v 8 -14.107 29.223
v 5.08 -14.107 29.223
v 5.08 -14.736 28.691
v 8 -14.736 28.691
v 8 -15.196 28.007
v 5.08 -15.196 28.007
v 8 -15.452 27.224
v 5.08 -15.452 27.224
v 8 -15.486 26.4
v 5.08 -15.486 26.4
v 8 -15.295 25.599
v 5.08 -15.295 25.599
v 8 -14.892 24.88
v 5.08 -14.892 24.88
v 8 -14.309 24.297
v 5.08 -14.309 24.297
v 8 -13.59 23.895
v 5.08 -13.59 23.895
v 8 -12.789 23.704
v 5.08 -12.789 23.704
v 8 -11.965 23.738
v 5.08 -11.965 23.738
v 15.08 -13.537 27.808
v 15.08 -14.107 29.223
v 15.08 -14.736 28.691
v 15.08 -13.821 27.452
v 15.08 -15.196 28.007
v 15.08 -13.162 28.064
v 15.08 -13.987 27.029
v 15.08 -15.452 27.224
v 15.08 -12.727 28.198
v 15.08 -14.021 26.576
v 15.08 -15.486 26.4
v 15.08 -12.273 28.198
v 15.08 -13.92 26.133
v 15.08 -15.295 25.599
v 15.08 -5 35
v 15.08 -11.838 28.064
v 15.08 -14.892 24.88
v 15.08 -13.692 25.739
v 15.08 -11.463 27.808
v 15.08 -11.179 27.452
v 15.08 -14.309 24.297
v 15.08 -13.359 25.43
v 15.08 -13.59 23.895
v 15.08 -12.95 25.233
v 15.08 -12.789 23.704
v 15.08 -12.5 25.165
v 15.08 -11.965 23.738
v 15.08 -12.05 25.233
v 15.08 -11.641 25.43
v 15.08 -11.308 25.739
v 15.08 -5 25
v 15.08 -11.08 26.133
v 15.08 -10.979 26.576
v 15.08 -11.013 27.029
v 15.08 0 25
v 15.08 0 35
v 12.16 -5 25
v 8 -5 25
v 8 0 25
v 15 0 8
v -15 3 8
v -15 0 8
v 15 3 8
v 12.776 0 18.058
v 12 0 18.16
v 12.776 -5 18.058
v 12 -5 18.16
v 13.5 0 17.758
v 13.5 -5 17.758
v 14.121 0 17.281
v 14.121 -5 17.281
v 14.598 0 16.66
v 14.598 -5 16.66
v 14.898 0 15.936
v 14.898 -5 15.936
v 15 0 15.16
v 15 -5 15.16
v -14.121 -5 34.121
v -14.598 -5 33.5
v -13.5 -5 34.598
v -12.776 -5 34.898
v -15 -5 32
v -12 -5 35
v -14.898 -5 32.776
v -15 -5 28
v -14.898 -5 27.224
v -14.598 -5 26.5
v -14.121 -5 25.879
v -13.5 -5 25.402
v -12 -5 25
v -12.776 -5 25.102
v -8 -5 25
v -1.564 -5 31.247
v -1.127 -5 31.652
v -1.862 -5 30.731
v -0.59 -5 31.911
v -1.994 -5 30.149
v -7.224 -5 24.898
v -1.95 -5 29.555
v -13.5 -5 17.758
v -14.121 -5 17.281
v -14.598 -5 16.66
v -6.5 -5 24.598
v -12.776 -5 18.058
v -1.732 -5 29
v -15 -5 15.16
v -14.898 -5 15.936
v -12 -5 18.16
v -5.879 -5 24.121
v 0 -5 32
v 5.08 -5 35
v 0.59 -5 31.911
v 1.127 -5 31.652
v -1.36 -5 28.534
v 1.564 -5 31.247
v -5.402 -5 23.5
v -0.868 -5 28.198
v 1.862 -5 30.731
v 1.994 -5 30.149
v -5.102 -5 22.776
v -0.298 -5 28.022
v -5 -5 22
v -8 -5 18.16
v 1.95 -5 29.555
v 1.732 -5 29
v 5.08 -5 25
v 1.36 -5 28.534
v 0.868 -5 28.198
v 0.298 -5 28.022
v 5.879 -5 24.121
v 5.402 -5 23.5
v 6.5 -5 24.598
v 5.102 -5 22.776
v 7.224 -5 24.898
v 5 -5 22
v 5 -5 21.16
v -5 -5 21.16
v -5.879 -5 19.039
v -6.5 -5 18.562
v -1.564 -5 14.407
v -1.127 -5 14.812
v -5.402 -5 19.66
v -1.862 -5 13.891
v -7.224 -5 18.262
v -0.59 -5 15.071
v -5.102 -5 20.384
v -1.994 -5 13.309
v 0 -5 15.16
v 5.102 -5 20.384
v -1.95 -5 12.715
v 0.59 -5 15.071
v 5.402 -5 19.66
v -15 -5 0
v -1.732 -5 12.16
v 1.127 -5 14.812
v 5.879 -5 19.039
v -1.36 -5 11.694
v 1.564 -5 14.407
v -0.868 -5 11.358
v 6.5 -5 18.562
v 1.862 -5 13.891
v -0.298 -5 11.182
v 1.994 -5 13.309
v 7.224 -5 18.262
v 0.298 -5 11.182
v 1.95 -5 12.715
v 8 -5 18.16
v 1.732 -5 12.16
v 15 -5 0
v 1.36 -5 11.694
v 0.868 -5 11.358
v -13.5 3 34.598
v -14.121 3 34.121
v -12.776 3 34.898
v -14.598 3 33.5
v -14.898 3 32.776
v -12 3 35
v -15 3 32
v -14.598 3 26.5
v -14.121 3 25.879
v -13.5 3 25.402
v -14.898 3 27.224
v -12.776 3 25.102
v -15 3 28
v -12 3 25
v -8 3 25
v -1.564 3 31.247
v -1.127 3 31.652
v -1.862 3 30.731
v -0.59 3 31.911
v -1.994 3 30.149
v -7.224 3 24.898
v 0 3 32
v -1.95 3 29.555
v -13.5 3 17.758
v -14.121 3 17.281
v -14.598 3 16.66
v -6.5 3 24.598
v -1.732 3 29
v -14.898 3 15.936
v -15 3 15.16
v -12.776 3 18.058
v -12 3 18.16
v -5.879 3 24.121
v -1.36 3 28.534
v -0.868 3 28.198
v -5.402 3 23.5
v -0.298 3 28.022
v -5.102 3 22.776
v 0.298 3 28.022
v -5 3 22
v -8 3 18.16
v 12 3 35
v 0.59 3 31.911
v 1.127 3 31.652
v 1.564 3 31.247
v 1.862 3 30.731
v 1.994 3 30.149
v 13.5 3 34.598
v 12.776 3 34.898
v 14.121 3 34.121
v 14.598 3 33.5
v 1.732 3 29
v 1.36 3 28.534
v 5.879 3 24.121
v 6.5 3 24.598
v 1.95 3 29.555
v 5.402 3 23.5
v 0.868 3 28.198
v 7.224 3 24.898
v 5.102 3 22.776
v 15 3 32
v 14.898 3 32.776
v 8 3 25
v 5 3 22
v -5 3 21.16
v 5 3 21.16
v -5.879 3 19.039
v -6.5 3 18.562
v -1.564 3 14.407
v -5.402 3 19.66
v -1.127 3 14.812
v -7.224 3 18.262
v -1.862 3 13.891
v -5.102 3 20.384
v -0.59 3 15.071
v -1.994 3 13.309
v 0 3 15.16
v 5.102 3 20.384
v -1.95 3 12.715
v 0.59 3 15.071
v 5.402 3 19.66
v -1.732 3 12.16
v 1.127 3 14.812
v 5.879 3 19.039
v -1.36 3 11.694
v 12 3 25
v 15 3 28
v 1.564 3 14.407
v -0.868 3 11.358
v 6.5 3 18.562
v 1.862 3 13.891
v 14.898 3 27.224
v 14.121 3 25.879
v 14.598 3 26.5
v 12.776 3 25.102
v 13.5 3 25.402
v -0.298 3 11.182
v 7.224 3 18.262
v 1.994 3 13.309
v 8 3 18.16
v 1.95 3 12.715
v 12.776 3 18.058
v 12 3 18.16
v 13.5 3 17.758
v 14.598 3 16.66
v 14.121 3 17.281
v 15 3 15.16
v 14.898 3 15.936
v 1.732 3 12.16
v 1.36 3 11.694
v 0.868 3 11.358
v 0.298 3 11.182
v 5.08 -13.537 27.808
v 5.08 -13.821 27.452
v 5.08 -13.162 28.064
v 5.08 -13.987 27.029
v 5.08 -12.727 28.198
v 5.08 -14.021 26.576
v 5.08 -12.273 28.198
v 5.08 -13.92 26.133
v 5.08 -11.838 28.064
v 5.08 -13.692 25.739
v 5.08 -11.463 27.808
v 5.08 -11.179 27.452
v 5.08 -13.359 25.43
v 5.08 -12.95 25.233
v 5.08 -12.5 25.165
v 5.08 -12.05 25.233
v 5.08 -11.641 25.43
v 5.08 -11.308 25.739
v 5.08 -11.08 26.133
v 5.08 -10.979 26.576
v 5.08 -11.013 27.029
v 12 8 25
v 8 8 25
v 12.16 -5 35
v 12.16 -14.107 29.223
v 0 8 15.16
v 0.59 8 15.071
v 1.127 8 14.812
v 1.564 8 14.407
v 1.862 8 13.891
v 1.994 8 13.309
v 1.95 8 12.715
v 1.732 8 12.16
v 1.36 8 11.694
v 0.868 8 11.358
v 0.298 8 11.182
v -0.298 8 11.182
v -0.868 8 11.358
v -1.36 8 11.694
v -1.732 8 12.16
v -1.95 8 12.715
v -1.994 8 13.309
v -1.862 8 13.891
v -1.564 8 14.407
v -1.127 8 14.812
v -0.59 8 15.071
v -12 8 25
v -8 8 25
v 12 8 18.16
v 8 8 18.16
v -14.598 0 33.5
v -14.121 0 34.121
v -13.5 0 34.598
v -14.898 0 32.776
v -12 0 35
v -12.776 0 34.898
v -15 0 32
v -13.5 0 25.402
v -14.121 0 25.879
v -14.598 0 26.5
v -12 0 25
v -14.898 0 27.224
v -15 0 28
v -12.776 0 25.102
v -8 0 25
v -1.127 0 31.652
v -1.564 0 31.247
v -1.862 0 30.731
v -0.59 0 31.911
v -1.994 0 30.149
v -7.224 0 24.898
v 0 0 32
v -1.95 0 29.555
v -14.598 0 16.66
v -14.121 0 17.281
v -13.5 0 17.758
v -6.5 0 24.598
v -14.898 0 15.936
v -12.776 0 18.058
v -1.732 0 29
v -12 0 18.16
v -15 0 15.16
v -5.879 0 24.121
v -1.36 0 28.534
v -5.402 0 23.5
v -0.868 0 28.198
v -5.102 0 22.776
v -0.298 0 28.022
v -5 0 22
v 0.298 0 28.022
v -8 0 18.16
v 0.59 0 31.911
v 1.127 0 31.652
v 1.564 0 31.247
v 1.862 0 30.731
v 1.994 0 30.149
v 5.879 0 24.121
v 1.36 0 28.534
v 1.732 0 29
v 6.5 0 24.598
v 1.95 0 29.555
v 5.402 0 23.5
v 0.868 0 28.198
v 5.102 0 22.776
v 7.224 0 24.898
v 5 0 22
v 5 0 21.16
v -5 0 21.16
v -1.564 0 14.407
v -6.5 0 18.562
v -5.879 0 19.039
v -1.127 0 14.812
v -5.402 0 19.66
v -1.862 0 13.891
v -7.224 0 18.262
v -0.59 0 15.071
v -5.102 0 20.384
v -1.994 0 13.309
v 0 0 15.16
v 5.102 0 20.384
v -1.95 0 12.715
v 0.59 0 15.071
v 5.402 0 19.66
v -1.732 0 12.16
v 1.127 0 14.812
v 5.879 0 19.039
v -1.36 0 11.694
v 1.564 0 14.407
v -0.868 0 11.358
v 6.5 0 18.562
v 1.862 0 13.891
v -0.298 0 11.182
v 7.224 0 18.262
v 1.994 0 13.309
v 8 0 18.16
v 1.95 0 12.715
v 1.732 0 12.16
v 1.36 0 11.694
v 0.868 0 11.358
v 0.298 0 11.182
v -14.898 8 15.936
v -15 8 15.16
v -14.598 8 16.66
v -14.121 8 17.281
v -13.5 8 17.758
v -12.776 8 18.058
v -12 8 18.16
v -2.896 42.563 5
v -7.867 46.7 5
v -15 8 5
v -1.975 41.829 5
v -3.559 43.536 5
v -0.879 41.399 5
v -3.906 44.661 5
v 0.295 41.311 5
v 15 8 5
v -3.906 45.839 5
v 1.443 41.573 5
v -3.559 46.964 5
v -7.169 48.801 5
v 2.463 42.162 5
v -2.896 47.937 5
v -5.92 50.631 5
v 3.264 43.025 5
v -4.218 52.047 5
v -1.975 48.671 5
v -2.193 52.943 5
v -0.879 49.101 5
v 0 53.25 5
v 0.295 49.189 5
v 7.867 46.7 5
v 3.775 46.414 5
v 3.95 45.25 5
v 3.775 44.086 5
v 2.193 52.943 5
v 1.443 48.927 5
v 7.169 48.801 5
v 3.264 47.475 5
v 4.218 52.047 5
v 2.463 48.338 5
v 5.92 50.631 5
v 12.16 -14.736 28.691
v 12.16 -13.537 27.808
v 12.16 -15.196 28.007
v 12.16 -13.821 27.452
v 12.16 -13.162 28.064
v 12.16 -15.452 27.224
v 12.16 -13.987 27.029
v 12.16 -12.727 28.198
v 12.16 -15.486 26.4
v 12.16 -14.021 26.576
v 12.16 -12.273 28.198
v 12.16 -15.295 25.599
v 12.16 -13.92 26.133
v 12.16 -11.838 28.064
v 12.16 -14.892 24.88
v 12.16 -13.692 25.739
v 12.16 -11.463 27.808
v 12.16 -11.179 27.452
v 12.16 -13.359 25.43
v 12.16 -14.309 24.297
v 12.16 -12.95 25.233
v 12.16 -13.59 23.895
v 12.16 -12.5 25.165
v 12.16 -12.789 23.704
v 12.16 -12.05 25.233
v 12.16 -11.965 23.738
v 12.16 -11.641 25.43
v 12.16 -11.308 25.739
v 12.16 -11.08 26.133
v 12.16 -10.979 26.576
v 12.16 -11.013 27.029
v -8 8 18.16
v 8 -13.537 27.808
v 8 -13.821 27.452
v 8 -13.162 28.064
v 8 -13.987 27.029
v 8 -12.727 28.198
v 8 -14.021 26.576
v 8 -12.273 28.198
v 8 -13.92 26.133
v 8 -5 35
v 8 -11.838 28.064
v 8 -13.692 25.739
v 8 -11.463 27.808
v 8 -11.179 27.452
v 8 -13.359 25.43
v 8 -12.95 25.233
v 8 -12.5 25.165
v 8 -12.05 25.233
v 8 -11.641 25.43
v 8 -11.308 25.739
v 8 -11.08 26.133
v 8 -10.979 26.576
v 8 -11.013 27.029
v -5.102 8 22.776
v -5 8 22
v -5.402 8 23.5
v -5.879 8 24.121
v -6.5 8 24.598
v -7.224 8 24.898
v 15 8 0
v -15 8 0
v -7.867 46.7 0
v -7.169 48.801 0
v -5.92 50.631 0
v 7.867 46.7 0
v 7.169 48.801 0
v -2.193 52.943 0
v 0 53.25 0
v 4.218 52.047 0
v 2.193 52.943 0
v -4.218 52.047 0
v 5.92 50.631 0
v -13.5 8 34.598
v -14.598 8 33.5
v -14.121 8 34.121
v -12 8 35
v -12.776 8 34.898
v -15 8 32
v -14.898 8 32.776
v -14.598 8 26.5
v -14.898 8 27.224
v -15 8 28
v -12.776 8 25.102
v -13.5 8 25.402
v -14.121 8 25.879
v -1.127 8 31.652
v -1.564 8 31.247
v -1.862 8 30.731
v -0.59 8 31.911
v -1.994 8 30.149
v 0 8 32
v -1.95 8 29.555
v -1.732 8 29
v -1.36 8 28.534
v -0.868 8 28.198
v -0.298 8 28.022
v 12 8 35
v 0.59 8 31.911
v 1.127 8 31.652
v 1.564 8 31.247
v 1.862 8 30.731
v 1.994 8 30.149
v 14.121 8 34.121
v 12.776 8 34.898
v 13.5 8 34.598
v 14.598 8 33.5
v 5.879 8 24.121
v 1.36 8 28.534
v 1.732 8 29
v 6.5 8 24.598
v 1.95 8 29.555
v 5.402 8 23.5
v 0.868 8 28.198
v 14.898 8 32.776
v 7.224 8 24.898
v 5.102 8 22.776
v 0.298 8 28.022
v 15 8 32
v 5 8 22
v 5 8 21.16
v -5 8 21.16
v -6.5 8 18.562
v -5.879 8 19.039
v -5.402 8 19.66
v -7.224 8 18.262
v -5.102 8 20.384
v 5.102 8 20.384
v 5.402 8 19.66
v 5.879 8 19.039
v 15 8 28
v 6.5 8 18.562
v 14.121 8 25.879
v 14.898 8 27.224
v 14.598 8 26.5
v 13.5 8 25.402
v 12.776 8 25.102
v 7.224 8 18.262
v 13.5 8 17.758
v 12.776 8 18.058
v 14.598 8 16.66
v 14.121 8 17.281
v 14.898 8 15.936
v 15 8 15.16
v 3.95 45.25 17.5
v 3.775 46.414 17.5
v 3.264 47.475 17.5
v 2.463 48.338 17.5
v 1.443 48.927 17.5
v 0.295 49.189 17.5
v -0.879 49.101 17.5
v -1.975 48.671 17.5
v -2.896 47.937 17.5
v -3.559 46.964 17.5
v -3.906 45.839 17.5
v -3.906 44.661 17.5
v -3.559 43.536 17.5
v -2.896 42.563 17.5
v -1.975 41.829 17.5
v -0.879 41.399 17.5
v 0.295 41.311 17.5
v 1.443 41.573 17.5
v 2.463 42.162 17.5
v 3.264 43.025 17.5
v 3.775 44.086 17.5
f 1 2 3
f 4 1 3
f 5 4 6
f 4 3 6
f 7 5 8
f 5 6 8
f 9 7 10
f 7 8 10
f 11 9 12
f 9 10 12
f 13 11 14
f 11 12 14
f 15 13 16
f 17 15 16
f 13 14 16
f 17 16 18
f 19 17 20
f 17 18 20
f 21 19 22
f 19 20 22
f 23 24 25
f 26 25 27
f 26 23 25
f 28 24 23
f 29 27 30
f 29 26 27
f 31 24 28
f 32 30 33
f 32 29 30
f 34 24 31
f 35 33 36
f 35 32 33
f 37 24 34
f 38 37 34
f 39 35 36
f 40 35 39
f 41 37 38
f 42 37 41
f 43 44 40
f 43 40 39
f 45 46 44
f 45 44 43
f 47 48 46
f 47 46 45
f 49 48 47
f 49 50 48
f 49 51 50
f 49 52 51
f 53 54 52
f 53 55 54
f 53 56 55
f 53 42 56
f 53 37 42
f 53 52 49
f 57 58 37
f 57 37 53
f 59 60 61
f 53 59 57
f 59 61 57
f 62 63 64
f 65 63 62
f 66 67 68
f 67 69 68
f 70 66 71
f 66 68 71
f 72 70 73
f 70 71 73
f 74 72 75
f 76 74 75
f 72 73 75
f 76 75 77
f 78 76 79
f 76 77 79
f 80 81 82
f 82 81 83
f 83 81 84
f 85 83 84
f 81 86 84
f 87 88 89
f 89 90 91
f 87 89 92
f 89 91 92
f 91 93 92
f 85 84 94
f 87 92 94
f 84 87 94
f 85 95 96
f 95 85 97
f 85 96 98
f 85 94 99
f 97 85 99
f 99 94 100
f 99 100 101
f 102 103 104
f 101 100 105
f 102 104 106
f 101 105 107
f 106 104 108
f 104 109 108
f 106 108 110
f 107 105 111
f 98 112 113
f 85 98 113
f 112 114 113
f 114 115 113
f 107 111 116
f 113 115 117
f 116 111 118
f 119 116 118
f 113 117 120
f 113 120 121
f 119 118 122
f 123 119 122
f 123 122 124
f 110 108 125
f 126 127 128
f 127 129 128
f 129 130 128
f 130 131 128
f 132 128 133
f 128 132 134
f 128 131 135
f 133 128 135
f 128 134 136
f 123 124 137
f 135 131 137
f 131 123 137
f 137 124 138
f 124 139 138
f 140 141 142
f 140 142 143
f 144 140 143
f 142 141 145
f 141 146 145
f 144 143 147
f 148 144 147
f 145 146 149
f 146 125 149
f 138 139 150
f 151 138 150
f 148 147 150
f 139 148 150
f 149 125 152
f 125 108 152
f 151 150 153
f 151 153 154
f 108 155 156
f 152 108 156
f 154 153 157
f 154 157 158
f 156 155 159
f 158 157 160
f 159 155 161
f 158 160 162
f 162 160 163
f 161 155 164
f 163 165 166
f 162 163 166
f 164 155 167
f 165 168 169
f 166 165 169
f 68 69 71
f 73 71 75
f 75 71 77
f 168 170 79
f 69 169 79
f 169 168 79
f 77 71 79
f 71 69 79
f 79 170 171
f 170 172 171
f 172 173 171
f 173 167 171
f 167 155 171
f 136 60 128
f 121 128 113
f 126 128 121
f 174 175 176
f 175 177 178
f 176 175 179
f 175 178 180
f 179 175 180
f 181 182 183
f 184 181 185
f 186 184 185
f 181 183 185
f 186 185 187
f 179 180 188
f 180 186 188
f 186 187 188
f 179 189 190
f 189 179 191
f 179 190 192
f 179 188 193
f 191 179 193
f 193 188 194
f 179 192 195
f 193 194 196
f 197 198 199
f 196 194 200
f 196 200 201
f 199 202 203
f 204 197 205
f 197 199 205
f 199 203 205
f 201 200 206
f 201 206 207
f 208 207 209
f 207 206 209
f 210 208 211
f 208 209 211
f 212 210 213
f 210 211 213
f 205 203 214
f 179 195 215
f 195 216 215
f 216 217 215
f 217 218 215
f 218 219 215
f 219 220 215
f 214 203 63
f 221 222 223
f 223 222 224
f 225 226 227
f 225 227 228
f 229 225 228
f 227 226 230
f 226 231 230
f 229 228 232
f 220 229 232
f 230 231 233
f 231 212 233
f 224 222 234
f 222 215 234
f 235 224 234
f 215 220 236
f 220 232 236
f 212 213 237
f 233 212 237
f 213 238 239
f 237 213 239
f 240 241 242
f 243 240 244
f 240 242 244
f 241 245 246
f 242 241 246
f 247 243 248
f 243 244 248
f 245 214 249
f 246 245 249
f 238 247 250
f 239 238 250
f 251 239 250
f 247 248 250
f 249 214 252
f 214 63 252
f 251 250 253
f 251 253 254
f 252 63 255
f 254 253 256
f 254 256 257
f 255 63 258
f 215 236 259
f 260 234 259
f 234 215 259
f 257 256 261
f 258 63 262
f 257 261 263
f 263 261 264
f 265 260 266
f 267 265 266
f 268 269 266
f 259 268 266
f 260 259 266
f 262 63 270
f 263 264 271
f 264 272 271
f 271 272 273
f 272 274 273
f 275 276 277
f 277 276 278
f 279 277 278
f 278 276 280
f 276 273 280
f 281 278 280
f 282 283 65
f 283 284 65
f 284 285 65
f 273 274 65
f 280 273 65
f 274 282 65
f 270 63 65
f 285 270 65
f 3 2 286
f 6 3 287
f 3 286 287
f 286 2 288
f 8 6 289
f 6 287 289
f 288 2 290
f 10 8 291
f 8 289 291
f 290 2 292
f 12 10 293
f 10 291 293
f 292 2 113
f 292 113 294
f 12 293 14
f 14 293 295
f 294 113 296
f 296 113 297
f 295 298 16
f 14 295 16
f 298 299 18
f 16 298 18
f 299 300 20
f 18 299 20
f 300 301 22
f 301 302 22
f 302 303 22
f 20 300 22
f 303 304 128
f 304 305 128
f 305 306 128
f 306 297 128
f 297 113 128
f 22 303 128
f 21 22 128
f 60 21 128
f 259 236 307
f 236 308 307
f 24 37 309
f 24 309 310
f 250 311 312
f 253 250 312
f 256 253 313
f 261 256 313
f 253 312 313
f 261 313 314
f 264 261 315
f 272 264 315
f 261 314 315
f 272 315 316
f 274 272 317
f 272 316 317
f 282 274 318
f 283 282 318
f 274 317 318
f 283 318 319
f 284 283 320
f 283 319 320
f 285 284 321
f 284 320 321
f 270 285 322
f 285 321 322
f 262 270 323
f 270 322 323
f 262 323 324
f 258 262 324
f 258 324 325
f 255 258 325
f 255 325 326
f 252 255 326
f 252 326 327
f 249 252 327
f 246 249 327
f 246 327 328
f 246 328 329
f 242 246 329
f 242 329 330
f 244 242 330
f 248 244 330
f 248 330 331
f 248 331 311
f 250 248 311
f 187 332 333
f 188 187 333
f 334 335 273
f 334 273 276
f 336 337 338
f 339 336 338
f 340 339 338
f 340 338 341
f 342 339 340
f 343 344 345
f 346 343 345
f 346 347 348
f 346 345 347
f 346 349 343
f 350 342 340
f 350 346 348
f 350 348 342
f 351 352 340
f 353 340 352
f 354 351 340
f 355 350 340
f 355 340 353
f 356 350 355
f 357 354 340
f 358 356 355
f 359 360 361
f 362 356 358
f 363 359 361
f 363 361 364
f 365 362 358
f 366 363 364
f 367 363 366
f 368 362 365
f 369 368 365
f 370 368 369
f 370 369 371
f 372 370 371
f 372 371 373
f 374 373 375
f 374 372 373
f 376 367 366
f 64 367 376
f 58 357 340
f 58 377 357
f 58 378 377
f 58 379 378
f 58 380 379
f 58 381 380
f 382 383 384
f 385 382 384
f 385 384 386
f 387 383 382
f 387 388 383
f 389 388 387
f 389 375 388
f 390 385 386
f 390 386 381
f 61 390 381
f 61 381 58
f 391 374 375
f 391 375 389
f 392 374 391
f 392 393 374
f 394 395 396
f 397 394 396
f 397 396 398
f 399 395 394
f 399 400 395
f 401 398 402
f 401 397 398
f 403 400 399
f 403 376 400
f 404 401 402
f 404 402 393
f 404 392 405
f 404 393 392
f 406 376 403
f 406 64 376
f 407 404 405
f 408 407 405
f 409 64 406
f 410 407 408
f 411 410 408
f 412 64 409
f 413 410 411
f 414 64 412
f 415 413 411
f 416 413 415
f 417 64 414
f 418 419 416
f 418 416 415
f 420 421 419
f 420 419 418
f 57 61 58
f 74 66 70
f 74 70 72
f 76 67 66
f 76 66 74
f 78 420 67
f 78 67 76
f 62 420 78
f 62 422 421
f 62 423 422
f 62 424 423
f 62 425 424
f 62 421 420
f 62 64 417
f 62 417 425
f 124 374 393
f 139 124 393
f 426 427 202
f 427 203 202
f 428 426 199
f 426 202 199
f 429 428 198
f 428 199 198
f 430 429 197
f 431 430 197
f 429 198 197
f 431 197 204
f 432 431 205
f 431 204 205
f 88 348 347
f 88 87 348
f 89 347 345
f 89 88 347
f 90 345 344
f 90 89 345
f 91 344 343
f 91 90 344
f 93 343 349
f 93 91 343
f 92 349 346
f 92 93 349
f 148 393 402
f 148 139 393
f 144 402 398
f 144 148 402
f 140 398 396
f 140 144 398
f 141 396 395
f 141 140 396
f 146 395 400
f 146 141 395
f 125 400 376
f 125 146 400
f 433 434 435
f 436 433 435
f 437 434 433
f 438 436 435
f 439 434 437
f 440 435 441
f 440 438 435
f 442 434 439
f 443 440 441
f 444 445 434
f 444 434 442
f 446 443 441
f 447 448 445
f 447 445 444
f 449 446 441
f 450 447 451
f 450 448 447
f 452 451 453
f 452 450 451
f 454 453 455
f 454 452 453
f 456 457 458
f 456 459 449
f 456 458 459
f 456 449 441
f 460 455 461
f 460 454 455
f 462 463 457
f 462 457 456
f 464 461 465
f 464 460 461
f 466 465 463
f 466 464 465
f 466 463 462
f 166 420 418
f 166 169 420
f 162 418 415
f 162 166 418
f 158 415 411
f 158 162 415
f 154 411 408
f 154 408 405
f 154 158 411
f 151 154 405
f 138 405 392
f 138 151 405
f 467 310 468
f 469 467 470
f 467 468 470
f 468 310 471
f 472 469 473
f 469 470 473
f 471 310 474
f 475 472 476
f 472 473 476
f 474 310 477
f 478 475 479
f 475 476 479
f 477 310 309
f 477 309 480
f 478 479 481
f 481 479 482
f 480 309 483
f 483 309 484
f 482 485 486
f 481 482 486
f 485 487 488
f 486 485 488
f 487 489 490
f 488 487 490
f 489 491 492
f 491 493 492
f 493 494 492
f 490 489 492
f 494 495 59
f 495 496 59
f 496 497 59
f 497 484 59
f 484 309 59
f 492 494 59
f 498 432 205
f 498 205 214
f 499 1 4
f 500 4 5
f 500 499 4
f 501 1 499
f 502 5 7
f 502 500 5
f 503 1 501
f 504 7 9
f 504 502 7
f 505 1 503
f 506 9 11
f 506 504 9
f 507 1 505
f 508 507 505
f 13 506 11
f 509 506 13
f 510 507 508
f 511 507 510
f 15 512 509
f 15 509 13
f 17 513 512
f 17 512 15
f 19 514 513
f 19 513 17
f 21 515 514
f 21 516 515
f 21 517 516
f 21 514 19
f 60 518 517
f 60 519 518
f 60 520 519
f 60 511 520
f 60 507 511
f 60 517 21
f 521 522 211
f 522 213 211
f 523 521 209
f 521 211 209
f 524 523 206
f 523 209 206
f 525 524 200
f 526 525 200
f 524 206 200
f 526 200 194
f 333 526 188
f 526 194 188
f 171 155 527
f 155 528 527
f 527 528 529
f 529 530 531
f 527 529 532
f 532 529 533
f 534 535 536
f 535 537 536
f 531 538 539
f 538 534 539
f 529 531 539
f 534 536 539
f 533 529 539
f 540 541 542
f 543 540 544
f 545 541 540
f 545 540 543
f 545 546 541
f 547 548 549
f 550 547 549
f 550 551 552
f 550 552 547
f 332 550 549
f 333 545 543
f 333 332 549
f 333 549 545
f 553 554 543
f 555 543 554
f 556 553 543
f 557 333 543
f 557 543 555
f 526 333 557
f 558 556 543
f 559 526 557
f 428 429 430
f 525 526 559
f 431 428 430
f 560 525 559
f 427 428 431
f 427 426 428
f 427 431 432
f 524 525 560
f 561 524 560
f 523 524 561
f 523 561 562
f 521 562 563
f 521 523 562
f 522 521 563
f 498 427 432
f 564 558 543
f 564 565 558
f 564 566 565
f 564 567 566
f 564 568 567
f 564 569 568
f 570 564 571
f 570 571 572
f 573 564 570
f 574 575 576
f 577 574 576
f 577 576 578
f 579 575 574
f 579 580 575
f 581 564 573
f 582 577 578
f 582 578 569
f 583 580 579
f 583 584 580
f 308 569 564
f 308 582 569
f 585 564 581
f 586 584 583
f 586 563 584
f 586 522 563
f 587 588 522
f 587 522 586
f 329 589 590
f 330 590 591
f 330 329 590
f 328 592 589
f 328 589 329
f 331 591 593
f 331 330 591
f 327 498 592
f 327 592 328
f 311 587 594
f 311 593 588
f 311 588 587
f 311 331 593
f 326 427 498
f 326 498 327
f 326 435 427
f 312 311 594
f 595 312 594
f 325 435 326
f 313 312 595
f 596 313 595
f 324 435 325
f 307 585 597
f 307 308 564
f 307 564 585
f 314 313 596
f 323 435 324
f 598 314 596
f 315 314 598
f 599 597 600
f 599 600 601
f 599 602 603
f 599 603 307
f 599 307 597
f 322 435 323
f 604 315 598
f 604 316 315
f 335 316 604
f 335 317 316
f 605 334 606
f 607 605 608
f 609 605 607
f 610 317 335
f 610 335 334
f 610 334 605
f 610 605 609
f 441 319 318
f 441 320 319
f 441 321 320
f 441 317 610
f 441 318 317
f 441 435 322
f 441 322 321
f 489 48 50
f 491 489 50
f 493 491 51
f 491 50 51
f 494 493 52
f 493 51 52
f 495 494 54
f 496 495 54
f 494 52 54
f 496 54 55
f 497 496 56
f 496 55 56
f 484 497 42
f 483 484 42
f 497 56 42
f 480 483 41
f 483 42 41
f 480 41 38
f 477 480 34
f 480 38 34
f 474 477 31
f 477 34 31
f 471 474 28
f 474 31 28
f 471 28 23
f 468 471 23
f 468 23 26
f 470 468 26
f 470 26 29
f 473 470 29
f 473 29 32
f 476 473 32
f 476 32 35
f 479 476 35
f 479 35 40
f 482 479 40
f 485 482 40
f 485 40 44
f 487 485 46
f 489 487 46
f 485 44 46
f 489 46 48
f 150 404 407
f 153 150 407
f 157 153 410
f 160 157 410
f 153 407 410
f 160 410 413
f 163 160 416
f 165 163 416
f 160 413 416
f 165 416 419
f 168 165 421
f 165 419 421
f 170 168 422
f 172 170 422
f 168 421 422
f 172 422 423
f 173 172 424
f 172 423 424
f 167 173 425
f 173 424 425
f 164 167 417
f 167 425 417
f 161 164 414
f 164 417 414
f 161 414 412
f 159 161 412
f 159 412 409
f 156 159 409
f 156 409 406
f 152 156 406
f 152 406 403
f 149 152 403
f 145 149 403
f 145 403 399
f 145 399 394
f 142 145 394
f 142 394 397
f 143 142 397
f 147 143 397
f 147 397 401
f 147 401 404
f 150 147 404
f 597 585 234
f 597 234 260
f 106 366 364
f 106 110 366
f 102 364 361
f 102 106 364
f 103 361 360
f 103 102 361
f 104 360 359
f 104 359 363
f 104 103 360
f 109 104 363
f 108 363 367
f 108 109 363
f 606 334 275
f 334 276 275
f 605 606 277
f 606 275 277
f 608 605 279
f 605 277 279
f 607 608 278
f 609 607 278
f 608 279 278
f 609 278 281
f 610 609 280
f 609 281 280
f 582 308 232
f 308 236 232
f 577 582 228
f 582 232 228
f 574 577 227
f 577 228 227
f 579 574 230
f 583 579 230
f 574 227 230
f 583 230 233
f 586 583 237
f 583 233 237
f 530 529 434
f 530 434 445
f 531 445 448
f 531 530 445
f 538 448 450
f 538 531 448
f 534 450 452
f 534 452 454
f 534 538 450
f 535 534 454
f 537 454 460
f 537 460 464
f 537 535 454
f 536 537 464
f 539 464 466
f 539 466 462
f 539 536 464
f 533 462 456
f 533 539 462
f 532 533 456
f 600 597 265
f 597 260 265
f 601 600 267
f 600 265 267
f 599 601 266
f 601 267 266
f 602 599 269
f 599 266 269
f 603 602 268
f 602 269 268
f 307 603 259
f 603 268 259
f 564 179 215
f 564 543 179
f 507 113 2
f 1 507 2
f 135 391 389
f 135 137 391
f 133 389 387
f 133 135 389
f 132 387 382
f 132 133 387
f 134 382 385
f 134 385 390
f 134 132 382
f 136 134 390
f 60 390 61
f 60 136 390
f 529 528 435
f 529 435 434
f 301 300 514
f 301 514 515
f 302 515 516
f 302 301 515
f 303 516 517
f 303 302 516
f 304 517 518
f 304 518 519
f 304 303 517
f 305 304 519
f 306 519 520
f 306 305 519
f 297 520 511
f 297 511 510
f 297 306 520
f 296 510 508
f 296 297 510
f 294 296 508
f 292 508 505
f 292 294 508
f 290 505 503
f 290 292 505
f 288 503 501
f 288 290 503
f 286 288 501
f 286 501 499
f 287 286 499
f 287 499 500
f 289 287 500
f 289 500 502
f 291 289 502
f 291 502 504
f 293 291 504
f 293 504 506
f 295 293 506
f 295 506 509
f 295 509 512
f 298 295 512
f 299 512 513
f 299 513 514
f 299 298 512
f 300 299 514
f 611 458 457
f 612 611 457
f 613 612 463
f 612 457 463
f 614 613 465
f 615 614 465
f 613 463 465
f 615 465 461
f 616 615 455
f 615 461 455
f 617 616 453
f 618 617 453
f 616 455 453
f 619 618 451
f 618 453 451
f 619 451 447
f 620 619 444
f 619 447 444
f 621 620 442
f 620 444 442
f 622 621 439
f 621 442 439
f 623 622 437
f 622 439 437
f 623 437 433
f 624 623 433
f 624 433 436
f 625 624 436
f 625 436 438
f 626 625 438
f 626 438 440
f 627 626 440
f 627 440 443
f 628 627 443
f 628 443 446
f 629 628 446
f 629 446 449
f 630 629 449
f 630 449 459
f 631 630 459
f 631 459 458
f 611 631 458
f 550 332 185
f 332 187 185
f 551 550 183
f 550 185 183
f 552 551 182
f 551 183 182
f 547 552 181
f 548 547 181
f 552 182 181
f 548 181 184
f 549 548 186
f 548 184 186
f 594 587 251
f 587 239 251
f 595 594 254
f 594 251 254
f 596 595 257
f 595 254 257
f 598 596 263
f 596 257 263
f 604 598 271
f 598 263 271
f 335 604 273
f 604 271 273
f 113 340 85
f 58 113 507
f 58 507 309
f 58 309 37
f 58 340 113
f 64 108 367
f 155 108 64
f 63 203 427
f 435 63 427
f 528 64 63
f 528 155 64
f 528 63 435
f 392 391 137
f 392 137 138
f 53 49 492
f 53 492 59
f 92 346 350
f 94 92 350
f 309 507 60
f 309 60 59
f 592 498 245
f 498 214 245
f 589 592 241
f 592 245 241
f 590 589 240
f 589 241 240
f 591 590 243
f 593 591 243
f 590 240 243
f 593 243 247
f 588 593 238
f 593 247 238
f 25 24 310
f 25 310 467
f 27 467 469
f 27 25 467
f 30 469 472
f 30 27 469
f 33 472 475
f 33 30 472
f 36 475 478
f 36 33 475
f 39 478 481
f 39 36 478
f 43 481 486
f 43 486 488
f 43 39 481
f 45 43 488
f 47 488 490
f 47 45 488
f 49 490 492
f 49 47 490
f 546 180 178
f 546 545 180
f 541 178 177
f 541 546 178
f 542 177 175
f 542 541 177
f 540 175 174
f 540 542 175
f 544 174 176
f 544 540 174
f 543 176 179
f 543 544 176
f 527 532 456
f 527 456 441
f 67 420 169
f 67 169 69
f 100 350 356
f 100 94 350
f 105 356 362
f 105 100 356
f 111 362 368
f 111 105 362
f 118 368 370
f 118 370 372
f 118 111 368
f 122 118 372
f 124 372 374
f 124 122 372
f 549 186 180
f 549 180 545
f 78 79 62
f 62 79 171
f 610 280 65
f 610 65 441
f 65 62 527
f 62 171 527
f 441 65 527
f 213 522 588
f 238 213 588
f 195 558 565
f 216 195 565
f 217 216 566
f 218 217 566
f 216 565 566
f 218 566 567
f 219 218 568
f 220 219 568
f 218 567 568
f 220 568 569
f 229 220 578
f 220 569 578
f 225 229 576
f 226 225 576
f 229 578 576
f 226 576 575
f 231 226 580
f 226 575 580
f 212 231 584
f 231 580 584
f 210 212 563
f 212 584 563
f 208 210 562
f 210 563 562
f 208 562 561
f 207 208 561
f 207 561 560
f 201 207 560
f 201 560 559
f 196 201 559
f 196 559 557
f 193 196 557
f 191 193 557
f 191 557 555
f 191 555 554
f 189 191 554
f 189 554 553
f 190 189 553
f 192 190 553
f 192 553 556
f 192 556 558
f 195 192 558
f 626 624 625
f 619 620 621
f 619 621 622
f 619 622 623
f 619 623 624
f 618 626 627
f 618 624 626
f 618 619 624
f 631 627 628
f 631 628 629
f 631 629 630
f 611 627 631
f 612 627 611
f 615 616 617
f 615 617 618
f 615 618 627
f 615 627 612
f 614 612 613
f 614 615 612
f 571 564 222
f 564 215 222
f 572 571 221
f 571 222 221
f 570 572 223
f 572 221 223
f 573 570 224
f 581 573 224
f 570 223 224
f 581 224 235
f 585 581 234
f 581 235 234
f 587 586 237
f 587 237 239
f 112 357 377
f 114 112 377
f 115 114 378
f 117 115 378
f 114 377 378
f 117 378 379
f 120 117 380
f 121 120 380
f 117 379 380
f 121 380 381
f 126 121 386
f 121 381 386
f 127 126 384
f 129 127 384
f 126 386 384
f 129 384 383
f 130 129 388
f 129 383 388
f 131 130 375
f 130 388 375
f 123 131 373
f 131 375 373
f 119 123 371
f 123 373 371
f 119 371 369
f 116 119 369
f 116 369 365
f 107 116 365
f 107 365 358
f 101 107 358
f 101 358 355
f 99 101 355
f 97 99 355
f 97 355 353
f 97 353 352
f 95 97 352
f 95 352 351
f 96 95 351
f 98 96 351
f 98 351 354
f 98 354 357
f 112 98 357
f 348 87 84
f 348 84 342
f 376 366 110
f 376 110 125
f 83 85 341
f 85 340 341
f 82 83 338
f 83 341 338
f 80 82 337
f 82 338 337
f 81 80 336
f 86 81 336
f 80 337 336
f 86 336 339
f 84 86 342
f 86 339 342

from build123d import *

# Parameters (mm, degrees)
SKETCH_1_R          = 3.95
SKETCH_1_W          = 30
SKETCH_1_H          = 5
SKETCH_1_H_2        = 3
EXTRUDE_1_DEPTH     = 5
SKETCH_1_3_W        = 30
SKETCH_1_3_H        = 5
EXTRUDE_2_DEPTH     = 35
SKETCH_1_5_R        = 3.95
EXTRUDE_3_DEPTH     = 17.5
SKETCH_1_6_W        = 30
SKETCH_1_6_H        = 3
EXTRUDE_4_DEPTH     = 8
SKETCH_2_W          = 10
SKETCH_2_H          = 6.84
SKETCH_2_R          = 2
CUT_EXTRUDE_1_DEPTH = 16
SKETCH_2_3_W        = 10
SKETCH_2_3_H        = 10
EXTRUDE_5_DEPTH     = 13
SKETCH_2_4_W        = 10
SKETCH_2_4_H        = 10
CUT_EXTRUDE_2_DEPTH = 8
FILLET_1_R          = 3
SKETCH_3_W          = 9.92
SKETCH_3_H          = 10
CUT_EXTRUDE_4_DEPTH = 8
SKETCH_4_R          = 1.525
EXTRUDE_6_DEPTH     = 2.92


with BuildPart() as part:
    # 草图1 → 凸台-拉伸1 (new body)
    # profile 1 of 4: a face of its own
    with BuildSketch(Plane.XY):
        with BuildLine():
            ThreePointArc((-7.867496672, 46.69999866), (0, 53.25), (7.867496672, 46.69999866))
            Line((7.867496672, 46.69999866), (15, 8))
            Line((15, 8), (-15, 8))
            Line((-15, 8), (-7.867496672, 46.69999866))
        make_face()
        with Locations((0, 45.25)):
            Circle(SKETCH_1_R, mode=Mode.SUBTRACT)
    # profile 2 of 4: a face of its own
    with BuildSketch(Plane.XY):
        with Locations((0, -2.5)):
            Rectangle(SKETCH_1_W, SKETCH_1_H)
    # profile 3 of 4: a face of its own
    with BuildSketch(Plane.XY):
        with Locations((0, 5.5)):
            Rectangle(SKETCH_1_W, SKETCH_1_H)
    # profile 4 of 4: a face of its own
    with BuildSketch(Plane.XY):
        with Locations((0, 1.5)):
            Rectangle(SKETCH_1_W, SKETCH_1_H_2)
    extrude(amount=EXTRUDE_1_DEPTH)

    # 草图1<3> → 凸台-拉伸2 (add)
    with BuildSketch(Plane.XY):
        with Locations((0, 5.5)):
            Rectangle(SKETCH_1_3_W, SKETCH_1_3_H)
        with Locations((0, -2.5)):
            Rectangle(SKETCH_1_3_W, SKETCH_1_3_H)
    extrude(amount=EXTRUDE_2_DEPTH)

    # 草图1<5> → 凸台-拉伸3 (add)
    with BuildSketch(Plane.XY):
        with Locations((0, 45.25)):
            Circle(SKETCH_1_5_R)
    extrude(amount=EXTRUDE_3_DEPTH)

    # 草图1<6> → 凸台-拉伸4 (add)
    with BuildSketch(Plane.XY):
        with Locations((0, 1.5)):
            Rectangle(SKETCH_1_6_W, SKETCH_1_6_H)
    extrude(amount=EXTRUDE_4_DEPTH)

    # 草图2 → 切除-拉伸1 (cut)
    with BuildSketch(Plane(origin=(0, 8, 0), x_dir=(1, 0, 0), z_dir=(0, 1, 0))):
        with Locations((-10, -21.58)):
            Rectangle(SKETCH_2_W, SKETCH_2_H)
        with Locations((10, -21.58)):
            Rectangle(SKETCH_2_W, SKETCH_2_H)
        with Locations(Location((0, -13.16, 0), (0, 0, 270))):
            Circle(SKETCH_2_R)
        with Locations(Location((0, -30, 0), (0, 0, 270))):
            Circle(SKETCH_2_R)
    extrude(amount=-CUT_EXTRUDE_1_DEPTH, mode=Mode.SUBTRACT)

    # 草图2<3> → 凸台-拉伸5 (add)
    with BuildSketch(Plane(origin=(0, 8, 0), x_dir=(1, 0, 0), z_dir=(0, 1, 0))):
        with Locations((20, -30)):
            Rectangle(SKETCH_2_3_W, SKETCH_2_3_H)
    extrude(amount=-EXTRUDE_5_DEPTH)

    # 草图2<4> → 切除-拉伸2 (cut)
    with BuildSketch(Plane(origin=(0, 8, 0), x_dir=(1, 0, 0), z_dir=(0, 1, 0))):
        with Locations((20, -30)):
            Rectangle(SKETCH_2_4_W, SKETCH_2_4_H)
    extrude(amount=-CUT_EXTRUDE_2_DEPTH, mode=Mode.SUBTRACT)

    # 圆角1
    fillet_1_edges = [part.edges().sort_by_distance(p)[0] for p in [
        (-15, -2.5, 18.16),
        (-15, 5.5, 18.16),
        (-5, -2.5, 18.16),
        (-5, 5.5, 18.16),
        (-5, -2.5, 25),
        (-5, 5.5, 25),
        (-15, -2.5, 25),
        (-15, 5.5, 25),
        (5, -2.5, 25),
        (5, 5.5, 25),
        (5, -2.5, 18.16),
        (5, 5.5, 18.16),
        (15, -2.5, 18.16),
        (15, 5.5, 18.16),
        (15, 5.5, 35),
        (15, 5.5, 25),
        (-15, 5.5, 35),
        (-15, -2.5, 35),
    ]]
    fillet(fillet_1_edges, radius=FILLET_1_R)

    # 草图3 → 切除-拉伸4 (cut)
    with BuildSketch(Plane.XZ.offset(5)):
        with Locations((20.04, 30)):
            Rectangle(SKETCH_3_W, SKETCH_3_H)
    extrude(amount=-CUT_EXTRUDE_4_DEPTH, mode=Mode.SUBTRACT)

    # 草图4 → 凸台-拉伸6 (add)
    with BuildSketch(Plane(origin=(15.08, 0, 0), x_dir=(0, 0, -1), z_dir=(1, 0, 0))):
        with BuildLine():
            Line((-35, -5), (-29.223331883, -14.106931726))
            ThreePointArc((-29.223331883, -14.106931726), (-25.598856813, -15.294531543), (-23.738058654, -11.965170783))
            Line((-23.738058654, -11.965170783), (-25, -5))
            Line((-25, -5), (-35, -5))
        make_face()
        with Locations((-26.69, -12.5)):
            Circle(SKETCH_4_R, mode=Mode.SUBTRACT)
    extrude_6 = extrude(amount=-EXTRUDE_6_DEPTH)

    # 镜向1: 凸台-拉伸6 across plane
    add(extrude_6.mirror(Plane(origin=(10.08, 0, 0), x_dir=(0, 0, 1), z_dir=(1, 0, 0))))


solid = part.part
